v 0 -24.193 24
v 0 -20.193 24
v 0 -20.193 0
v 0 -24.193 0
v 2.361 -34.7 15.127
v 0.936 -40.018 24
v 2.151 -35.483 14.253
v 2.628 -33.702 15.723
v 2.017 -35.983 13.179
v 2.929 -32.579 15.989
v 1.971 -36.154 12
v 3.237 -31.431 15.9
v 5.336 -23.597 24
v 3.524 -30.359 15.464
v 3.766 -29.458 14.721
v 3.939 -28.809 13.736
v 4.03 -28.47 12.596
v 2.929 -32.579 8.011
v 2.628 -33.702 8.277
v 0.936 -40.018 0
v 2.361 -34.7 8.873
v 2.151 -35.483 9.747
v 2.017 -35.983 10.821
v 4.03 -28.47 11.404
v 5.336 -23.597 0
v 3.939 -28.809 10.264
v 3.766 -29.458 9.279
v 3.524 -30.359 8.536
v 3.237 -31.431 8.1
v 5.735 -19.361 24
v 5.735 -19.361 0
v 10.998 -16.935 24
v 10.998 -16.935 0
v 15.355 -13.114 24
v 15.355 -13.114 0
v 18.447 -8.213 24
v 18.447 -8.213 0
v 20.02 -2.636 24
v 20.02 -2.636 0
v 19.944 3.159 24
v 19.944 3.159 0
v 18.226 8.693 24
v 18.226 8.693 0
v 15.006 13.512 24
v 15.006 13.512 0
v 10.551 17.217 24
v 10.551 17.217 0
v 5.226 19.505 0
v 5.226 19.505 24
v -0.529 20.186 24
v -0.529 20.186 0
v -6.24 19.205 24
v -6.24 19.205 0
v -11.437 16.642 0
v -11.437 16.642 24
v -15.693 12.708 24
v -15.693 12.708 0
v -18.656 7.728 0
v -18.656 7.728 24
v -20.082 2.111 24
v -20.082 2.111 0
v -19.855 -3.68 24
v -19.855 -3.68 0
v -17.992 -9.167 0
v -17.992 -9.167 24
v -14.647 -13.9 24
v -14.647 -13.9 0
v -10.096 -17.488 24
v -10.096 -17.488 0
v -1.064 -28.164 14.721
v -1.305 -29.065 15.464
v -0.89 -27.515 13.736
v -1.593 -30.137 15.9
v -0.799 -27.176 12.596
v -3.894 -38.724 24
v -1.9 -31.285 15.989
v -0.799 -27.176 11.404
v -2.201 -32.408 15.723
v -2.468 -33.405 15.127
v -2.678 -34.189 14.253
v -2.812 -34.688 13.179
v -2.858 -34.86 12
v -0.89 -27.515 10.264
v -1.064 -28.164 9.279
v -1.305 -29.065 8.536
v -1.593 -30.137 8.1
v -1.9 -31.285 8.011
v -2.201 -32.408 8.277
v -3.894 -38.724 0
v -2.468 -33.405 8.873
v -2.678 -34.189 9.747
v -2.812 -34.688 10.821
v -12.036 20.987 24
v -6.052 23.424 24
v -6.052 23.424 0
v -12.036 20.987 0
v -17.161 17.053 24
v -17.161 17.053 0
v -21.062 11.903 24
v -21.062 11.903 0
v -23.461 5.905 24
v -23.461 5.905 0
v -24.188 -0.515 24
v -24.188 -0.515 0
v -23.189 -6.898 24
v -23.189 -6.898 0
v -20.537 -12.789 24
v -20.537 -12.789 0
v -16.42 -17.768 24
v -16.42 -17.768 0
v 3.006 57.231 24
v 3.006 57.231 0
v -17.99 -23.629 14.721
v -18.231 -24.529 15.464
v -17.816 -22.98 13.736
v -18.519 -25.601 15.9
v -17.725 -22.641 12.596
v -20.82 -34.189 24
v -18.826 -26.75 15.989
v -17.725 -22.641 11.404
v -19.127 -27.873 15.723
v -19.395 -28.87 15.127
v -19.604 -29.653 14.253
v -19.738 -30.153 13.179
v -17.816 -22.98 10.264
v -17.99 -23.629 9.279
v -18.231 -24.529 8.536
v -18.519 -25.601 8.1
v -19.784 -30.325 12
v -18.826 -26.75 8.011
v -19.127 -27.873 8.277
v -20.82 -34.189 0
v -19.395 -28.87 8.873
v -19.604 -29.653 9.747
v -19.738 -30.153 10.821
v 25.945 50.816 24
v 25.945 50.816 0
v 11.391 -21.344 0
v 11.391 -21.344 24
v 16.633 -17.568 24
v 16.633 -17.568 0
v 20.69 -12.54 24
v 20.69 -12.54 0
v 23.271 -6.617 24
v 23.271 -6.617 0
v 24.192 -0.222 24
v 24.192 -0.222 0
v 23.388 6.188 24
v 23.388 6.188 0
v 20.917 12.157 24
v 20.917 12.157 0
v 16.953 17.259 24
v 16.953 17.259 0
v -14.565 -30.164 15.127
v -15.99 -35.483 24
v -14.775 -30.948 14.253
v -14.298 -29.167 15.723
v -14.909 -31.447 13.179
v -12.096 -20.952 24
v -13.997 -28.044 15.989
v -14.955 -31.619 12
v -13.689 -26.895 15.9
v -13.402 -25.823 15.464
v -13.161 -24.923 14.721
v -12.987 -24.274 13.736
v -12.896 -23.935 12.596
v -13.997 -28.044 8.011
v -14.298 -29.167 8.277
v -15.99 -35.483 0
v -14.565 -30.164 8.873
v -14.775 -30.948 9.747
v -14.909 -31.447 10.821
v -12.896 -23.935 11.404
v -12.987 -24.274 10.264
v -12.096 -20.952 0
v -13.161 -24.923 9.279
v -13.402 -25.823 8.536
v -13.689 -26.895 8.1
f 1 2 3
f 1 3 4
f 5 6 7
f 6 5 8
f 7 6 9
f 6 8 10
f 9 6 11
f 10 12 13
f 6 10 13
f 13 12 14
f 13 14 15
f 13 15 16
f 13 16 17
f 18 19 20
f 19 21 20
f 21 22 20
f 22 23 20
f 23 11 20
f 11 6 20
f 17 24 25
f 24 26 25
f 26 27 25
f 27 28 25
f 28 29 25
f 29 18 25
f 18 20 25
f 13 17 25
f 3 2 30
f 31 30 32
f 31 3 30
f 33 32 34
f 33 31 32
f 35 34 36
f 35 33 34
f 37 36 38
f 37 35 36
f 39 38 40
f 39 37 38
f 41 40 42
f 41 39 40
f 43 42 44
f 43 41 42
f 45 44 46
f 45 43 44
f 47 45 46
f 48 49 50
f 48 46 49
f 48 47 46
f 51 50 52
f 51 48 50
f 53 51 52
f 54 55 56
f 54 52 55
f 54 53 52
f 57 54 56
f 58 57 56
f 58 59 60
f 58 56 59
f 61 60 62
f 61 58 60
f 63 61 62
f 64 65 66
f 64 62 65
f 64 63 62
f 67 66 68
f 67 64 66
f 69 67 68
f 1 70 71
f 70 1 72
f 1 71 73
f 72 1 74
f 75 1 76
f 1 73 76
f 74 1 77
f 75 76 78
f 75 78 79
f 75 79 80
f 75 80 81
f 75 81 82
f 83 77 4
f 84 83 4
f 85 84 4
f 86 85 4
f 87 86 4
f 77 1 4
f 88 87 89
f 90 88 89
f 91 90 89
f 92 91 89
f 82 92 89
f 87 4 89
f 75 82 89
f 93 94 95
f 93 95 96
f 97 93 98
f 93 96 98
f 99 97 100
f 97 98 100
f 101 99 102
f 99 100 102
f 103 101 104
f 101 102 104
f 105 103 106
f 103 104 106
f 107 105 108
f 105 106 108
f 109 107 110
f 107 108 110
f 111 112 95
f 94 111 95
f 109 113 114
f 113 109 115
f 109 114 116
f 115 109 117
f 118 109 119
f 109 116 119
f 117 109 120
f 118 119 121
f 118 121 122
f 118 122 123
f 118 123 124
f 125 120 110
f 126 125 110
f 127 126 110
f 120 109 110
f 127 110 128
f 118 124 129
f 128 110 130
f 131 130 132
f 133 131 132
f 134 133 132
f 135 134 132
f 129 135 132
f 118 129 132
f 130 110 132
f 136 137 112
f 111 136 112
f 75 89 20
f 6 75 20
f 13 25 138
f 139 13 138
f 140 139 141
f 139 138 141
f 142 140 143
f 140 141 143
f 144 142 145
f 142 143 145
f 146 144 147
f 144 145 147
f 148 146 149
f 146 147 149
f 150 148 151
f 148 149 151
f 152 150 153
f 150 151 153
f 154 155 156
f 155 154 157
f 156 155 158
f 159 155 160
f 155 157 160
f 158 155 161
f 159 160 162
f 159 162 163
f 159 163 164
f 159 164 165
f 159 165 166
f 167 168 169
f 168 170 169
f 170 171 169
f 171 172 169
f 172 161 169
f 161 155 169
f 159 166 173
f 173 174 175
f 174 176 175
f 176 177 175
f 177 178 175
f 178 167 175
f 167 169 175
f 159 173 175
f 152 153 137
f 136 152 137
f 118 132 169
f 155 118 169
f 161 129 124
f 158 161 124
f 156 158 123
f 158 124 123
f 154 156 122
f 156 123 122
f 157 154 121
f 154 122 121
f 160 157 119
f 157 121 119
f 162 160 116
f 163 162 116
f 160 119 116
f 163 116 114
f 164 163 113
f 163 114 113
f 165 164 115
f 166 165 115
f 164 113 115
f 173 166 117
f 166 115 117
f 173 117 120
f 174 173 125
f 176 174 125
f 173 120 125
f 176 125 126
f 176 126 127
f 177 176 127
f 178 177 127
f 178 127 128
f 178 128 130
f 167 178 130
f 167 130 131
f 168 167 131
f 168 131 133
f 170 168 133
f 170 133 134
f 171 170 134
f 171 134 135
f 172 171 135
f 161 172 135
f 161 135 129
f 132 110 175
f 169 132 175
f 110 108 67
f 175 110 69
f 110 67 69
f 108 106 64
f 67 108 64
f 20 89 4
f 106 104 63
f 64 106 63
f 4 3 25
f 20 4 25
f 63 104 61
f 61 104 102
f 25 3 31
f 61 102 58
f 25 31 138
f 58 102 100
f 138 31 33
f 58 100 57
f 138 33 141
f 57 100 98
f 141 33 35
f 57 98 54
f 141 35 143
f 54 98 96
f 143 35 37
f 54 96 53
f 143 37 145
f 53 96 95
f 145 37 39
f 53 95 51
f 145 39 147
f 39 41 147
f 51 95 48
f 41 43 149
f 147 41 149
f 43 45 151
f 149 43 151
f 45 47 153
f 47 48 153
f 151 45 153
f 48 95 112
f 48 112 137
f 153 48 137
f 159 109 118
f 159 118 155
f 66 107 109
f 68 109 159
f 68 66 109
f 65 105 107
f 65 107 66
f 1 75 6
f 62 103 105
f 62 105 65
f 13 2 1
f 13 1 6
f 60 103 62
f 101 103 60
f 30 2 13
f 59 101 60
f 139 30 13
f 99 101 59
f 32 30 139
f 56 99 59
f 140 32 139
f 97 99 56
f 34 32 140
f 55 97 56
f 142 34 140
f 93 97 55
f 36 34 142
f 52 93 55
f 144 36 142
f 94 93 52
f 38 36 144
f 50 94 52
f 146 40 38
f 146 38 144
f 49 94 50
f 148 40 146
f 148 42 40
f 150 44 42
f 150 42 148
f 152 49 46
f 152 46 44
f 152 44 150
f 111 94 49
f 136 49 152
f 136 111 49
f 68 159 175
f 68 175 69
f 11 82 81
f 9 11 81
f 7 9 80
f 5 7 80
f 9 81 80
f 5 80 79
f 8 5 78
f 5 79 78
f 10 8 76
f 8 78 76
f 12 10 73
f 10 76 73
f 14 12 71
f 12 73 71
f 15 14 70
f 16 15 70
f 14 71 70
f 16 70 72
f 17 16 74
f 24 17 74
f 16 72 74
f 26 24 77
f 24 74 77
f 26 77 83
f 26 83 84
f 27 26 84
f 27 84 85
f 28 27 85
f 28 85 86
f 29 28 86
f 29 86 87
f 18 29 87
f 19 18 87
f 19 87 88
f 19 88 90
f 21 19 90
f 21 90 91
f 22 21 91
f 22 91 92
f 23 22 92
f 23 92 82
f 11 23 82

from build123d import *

# Parameters (mm, degrees)
SKETCH1_R           = 24.193
SKETCH1_R_2         = 20.193
BOSS_EXTRUDE1_DEPTH = 24
CUT_EXTRUDE1_DEPTH  = 24
BOSS_EXTRUDE2_START = -24
BOSS_EXTRUDE2_DEPTH = 24
SKETCH4_R           = 4
CUT_EXTRUDE2_DEPTH  = 24
BOSS_EXTRUDE4_START = -24
BOSS_EXTRUDE4_DEPTH = 24


with BuildPart() as part:
    # Sketch1 → Boss-Extrude1 (new body)
    with BuildSketch(Plane.XY):
        Circle(SKETCH1_R)
        Circle(SKETCH1_R_2, mode=Mode.SUBTRACT)
    extrude(amount=BOSS_EXTRUDE1_DEPTH)

    # Sketch2 → Cut-Extrude1 (cut)
    with BuildSketch(Plane.XY.offset(24)):
        Polygon((0, -24.193), (-5.8341998, -24.895299835), (-12.0965, -20.951752594), (0, 0), align=None)
    extrude(amount=-CUT_EXTRUDE1_DEPTH, mode=Mode.SUBTRACT)

    # Sketch3 → Boss-Extrude2 (add)
    with BuildSketch(Plane.XY.offset(24).offset(BOSS_EXTRUDE2_START)):
        with BuildLine():
            Line((-15.990029306, -35.482601784), (-12.0965, -20.951752594))
            ThreePointArc((-12.0965, -20.951752594), (-14.346719144, -19.480064138), (-16.419734671, -17.767767512))
            Line((-16.419734671, -17.767767512), (-20.819658437, -34.188506559))
            Line((-20.819658437, -34.188506559), (-15.990029306, -35.482601784))
        make_face()
        with BuildLine():
            ThreePointArc((5.336023592, -23.597205369), (2.684591171, -24.043589982), (0, -24.193))
            Line((0, -24.193), (-3.893529306, -38.72384919))
            Line((-3.893529306, -38.72384919), (0.936099826, -40.017944416))
            Line((0.936099826, -40.017944416), (5.336023592, -23.597205369))
        make_face()
    extrude(amount=BOSS_EXTRUDE2_DEPTH)

    # Sketch4 → Cut-Extrude2 (cut)
    with BuildSketch(Plane(origin=(-10.877879131, 2.914718929, 0), x_dir=(0, 0, 1), z_dir=(-0.9659258262890682, 0.2588190451025212, 0))):
        with Locations(Location((12, -30.412085563, 0), (0, 0, 270))):
            Circle(SKETCH4_R)
    extrude(amount=-CUT_EXTRUDE2_DEPTH, mode=Mode.SUBTRACT)

    # Sketch5 → Boss-Extrude4 (add)
    with BuildSketch(Plane.XY.offset(24).offset(BOSS_EXTRUDE4_START)):
        with BuildLine():
            ThreePointArc((-6.052435886, 23.423690334), (6.261609158, 23.368643515), (16.953408399, 17.259292937))
            Line((16.953408399, 17.259292937), (25.944897535, 50.81598723))
            Line((25.944897535, 50.81598723), (3.006230693, 57.231094254))
            Line((3.006230693, 57.231094254), (-6.052435886, 23.423690334))
        make_face()
    extrude(amount=BOSS_EXTRUDE4_DEPTH)


solid = part.part
